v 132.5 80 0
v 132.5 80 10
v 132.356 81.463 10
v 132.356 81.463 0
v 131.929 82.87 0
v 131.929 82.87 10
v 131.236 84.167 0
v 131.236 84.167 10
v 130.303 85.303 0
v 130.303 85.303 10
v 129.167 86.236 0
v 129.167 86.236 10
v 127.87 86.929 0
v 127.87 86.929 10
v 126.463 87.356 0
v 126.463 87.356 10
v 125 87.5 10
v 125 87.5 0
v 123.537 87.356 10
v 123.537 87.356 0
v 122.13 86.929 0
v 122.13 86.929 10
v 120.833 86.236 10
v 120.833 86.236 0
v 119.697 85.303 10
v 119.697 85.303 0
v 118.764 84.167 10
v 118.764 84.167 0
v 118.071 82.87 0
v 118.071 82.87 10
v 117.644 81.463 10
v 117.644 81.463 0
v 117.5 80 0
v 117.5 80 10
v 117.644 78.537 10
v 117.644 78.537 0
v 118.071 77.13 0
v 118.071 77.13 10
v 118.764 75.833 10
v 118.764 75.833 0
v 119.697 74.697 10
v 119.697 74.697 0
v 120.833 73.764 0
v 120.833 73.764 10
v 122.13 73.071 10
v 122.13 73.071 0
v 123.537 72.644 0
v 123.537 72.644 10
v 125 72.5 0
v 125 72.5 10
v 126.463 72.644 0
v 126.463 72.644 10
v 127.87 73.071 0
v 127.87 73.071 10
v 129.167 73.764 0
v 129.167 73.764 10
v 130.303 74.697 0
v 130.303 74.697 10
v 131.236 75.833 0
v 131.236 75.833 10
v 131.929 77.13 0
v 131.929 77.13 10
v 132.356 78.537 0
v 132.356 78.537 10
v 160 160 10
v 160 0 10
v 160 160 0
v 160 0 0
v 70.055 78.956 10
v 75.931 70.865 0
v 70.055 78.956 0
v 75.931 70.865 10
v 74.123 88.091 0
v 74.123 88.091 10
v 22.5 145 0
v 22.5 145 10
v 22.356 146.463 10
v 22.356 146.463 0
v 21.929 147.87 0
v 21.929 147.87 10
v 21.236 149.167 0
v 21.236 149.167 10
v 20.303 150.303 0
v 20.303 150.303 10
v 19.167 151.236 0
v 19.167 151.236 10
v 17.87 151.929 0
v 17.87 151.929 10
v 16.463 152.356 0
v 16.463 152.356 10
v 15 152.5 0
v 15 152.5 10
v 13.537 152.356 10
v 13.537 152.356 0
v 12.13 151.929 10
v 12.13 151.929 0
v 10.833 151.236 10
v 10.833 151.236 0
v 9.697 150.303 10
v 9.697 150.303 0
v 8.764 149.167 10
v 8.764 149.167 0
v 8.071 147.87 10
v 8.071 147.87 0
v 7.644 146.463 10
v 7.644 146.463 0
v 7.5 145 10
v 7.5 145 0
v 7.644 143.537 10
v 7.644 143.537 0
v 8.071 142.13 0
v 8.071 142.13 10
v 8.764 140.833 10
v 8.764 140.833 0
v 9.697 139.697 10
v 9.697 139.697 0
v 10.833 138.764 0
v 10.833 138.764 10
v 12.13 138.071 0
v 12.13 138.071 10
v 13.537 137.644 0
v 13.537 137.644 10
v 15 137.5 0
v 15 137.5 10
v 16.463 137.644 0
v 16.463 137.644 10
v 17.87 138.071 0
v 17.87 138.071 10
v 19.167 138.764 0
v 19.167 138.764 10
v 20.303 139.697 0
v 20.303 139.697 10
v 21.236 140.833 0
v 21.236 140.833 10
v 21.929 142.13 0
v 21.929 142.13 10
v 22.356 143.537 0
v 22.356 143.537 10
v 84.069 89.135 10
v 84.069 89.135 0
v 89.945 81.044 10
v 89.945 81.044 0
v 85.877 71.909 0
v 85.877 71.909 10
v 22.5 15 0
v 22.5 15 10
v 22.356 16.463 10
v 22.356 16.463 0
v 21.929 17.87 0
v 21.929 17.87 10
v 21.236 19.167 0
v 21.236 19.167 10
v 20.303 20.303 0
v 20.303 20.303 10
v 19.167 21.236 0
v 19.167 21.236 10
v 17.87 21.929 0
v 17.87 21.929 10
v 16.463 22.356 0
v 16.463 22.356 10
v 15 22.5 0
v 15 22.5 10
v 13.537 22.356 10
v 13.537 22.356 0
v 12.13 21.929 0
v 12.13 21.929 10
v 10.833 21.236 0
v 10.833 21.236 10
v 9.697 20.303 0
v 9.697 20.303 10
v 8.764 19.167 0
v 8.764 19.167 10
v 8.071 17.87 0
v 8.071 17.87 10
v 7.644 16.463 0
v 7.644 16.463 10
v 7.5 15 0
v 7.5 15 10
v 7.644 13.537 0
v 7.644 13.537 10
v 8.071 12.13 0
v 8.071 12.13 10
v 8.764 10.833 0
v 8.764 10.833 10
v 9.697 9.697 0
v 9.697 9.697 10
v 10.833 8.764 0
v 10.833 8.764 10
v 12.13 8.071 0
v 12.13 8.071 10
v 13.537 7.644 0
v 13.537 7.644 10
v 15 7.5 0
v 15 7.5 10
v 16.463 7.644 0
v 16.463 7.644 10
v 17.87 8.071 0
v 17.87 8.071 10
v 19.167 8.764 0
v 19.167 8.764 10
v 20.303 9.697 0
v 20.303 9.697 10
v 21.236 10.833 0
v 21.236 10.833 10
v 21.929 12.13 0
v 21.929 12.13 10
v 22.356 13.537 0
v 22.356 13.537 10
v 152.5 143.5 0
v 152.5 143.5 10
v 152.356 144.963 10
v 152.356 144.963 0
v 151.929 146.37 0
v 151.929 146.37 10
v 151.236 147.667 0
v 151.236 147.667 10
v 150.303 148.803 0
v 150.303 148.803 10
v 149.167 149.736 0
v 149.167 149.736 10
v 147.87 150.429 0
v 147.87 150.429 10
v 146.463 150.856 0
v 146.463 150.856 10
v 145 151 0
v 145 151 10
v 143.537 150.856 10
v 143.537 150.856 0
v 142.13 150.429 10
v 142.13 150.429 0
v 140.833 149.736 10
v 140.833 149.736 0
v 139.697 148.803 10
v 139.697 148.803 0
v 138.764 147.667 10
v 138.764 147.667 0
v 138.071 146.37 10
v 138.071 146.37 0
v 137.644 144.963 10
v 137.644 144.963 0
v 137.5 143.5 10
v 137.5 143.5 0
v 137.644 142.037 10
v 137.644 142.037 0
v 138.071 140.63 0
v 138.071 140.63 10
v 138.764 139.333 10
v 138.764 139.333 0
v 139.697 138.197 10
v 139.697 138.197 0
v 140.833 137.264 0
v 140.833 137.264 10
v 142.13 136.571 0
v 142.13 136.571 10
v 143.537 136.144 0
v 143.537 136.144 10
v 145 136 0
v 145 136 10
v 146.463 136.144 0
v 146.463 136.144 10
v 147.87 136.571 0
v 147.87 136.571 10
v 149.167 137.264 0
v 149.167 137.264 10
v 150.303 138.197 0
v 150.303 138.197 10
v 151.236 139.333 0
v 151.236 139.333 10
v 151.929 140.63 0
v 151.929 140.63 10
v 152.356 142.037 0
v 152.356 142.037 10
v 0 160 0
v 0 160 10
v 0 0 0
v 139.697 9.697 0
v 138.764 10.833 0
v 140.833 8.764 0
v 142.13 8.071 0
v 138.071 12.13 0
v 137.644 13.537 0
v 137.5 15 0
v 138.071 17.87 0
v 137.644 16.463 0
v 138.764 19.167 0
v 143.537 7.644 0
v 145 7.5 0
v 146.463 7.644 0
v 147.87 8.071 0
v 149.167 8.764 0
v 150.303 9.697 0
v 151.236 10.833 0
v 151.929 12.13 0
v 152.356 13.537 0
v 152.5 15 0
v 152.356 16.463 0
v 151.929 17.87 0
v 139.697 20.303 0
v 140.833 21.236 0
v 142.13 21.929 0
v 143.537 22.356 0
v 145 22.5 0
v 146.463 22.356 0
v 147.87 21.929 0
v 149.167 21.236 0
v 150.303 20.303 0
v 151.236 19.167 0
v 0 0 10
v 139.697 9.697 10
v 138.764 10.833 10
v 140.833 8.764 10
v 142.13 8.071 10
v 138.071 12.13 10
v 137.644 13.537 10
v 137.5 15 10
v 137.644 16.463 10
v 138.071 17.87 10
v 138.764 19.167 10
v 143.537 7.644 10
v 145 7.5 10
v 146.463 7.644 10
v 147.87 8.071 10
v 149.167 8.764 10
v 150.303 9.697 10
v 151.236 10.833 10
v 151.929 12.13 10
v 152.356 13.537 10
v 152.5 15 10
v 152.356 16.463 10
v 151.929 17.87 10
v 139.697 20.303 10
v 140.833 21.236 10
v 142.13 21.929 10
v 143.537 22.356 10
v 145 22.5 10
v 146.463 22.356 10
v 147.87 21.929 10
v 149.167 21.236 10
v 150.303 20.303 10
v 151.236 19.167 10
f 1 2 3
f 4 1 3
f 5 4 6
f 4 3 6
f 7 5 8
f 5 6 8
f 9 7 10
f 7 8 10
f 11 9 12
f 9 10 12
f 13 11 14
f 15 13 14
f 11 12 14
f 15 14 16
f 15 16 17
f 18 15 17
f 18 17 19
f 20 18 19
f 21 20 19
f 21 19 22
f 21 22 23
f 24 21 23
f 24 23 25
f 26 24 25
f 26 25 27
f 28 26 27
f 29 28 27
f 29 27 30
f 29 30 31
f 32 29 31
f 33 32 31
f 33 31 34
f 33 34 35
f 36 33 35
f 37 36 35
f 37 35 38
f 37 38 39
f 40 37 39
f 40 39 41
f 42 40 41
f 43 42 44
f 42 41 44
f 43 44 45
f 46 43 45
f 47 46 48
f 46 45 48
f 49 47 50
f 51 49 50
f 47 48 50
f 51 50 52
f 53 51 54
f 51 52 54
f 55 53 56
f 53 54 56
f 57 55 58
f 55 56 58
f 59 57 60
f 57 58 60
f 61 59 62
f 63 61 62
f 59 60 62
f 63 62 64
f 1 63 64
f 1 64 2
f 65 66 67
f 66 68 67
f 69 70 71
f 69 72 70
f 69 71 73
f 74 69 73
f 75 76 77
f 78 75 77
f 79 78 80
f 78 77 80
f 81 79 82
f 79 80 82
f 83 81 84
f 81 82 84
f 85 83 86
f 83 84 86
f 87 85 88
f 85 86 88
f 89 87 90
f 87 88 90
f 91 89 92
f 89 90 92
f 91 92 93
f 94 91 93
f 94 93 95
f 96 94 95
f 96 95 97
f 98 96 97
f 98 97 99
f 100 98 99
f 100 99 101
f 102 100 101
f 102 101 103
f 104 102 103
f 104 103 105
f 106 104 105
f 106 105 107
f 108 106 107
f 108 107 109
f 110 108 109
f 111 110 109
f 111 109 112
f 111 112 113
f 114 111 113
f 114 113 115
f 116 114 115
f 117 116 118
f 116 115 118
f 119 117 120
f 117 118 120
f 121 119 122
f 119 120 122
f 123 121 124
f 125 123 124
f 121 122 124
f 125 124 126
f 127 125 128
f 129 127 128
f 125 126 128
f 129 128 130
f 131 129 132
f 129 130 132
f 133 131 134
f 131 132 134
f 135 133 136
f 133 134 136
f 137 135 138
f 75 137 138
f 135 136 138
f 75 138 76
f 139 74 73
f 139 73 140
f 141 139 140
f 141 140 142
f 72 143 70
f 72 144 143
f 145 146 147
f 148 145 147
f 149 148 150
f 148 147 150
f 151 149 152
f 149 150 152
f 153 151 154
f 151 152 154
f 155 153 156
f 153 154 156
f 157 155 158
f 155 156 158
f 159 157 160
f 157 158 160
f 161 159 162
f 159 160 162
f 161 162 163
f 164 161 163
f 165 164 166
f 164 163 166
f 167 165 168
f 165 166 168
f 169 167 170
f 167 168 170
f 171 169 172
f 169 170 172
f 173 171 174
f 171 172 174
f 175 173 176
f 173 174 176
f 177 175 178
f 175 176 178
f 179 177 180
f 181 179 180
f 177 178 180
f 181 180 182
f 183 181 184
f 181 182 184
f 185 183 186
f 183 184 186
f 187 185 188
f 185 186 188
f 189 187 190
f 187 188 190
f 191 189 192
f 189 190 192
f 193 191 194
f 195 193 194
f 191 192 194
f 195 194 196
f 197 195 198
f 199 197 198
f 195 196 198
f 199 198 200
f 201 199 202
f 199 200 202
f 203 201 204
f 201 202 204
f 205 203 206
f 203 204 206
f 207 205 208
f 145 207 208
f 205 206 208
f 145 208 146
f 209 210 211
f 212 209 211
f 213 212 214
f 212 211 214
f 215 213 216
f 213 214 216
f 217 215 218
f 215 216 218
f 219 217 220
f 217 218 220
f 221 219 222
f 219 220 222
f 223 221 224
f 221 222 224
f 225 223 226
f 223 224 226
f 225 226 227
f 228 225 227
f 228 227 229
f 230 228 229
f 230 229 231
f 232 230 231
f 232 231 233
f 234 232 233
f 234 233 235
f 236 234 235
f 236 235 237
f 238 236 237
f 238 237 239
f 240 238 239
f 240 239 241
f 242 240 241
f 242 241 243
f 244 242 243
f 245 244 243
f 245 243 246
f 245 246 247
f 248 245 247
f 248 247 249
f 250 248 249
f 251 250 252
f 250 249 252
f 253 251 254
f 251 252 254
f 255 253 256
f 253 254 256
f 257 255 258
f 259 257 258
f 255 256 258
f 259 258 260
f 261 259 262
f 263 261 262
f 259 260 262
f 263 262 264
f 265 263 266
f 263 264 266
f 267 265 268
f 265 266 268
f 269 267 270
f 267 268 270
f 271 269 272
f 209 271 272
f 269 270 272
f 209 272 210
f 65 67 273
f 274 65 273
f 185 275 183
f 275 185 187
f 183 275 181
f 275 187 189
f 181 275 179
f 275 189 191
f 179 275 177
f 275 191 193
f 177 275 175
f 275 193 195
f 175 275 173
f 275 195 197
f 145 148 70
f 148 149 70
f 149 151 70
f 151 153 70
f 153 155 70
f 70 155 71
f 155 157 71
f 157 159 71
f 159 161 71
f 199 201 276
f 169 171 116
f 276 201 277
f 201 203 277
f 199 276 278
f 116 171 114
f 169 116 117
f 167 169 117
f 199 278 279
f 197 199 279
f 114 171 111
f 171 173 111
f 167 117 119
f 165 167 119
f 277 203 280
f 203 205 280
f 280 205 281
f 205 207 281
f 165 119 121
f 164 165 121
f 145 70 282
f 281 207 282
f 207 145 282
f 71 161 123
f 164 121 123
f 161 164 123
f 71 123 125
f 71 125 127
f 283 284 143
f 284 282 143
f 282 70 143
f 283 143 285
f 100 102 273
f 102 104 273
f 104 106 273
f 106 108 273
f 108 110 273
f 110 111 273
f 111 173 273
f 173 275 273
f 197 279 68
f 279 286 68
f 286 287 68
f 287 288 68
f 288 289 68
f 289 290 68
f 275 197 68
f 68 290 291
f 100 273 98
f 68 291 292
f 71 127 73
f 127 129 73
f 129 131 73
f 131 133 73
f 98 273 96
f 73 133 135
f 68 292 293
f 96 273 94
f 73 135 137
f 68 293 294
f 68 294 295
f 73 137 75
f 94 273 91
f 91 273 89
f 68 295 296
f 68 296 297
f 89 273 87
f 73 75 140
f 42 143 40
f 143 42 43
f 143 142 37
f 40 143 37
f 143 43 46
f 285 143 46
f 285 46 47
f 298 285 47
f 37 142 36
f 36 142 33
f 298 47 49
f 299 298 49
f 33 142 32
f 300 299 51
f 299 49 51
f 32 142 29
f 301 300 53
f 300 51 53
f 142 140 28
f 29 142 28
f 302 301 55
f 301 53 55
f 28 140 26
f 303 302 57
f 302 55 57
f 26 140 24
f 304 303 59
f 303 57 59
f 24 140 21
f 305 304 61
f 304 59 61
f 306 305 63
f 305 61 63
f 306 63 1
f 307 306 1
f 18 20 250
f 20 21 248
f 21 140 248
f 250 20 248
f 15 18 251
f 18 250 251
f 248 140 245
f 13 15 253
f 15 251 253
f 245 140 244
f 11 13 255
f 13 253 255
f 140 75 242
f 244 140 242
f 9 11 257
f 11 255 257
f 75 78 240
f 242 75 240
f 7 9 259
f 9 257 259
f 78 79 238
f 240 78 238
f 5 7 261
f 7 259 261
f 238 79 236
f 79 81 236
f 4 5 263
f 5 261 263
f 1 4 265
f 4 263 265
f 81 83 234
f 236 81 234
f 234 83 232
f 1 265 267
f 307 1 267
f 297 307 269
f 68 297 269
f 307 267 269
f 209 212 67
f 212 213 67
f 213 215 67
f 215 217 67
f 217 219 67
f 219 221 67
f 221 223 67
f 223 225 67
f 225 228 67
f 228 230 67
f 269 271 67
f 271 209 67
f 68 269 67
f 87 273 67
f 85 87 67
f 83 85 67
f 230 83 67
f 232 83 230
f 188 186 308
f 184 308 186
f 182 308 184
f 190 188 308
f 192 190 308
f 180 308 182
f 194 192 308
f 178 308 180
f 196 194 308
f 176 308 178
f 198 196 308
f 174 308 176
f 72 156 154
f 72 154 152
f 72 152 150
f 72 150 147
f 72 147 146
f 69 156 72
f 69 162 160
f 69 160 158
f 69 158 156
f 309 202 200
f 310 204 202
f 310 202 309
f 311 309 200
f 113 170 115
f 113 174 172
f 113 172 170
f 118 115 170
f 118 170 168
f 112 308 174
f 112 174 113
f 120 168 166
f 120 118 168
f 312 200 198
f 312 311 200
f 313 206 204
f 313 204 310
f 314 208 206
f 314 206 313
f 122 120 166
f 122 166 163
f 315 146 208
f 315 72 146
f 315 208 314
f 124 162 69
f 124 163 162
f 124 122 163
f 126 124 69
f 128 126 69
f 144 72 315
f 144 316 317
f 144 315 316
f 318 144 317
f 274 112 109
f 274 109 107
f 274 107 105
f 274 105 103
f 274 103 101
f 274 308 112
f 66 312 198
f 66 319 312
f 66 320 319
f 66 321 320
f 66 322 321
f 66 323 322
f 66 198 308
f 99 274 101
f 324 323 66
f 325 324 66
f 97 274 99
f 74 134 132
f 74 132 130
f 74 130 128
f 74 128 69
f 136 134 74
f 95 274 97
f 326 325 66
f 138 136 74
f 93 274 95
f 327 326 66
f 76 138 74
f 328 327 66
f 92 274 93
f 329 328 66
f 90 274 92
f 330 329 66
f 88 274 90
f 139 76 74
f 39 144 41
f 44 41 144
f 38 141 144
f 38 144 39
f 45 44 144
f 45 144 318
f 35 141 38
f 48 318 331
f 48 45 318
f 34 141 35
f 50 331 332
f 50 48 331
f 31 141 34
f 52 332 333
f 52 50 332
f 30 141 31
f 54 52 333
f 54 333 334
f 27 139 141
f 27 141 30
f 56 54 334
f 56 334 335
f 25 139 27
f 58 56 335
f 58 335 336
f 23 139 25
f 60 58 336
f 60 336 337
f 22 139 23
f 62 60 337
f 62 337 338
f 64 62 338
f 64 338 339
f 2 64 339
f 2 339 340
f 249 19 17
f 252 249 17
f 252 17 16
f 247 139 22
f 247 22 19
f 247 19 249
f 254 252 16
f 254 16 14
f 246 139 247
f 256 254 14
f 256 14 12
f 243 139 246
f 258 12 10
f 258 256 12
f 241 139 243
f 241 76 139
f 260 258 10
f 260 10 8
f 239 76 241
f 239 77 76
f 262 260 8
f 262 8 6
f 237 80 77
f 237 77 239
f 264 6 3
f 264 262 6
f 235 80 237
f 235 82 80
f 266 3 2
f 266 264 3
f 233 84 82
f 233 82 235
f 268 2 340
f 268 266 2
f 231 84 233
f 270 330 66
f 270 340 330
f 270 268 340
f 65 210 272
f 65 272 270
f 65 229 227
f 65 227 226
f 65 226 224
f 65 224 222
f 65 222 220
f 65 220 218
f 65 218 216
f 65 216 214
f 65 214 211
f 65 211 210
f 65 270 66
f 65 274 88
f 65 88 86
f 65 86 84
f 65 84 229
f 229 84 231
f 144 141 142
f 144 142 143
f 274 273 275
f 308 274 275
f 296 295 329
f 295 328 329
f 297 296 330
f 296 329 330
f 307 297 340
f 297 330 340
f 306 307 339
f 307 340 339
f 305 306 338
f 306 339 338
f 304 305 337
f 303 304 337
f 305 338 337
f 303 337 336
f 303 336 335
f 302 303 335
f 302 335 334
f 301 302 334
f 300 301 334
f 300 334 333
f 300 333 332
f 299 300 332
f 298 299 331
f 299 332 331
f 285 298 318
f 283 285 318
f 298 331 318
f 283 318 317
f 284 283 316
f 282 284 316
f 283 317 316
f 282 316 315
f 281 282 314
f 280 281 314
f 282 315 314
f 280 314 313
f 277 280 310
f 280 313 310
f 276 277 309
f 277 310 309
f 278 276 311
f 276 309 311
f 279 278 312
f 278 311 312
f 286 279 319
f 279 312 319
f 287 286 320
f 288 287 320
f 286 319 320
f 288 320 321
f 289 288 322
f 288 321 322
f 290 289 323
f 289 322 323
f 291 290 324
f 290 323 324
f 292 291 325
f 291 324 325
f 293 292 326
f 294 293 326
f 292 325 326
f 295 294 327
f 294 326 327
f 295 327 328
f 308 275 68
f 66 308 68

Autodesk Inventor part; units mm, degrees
ref_plane "YZ Plane" through (0, 0, 0) normal (1, 0, 0) x (0, 1, 0)
ref_plane "XZ Plane" through (0, 0, 0) normal (0, 1, 0) x (-1, 0, 0)
ref_plane "XY Plane" through (0, 0, 0) normal (0, 0, 1) x (1, 0, 0)
sketch "Sketch1" plane through (0, 0, 0) normal (0, 0, 1) x (1, 0, 0)
  line L0 (0, 0) -> (160, 0)
  line L1 (160, 0) -> (160, 160)
  line L2 (160, 160) -> (0, 160)
  line L3 (0, 160) -> (0, 0)
  dimension "d0" = 160
  dimension "d1" = 160
extrude "Extrusion1" add sketch "Sketch1" along normal blind 10
sketch "Sketch2" plane through (0, 0, 10) normal (0, 0, 1) x (1, 0, 0)
  line L0 (0, 0) -> (160, 0) projected
  line L1 (0, 0) -> (15, 0)
  line L2 (15, 0) -> (15, 15)
  line L3 (160, 160) -> (0, 160) projected
  line L4 (0, 160) -> (15, 160)
  line L5 (15, 160) -> (15, 145)
  line L6 (160, 0) -> (160, 160) projected
  line L7 (160, 160) -> (145, 160)
  line L8 (145, 160) -> (145, 143.5)
  line L9 (160, 0) -> (160, 15)
  line L10 (160, 15) -> (145, 15)
  circle A0 centre (15, 145) radius 7.5
  circle A1 centre (145, 143.5) radius 7.5
  circle A2 centre (145, 15) radius 7.5
  circle A3 centre (15, 15) radius 7.5
  dimension "d4" = 15
  dimension "d5" = 15
  dimension "d6" = 15
  dimension "d7" = 15
  dimension "d8" = 15
  dimension "d9" = 16.5
  dimension "d10" = 15
  dimension "d11" = 15
  dimension "d12" = 15
  dimension "d13" = 15
  dimension "d14" = 15
  dimension "d15" = 15
extrude "Extrusion2" cut sketch "Sketch2" against normal blind 10
sketch "Sketch3" plane through (0, 0, 10) normal (0, 0, 1) x (1, 0, 0)
  line L0 (0, 160) -> (0, 0) projected
  line L1 (0, 0) -> (80, 0)
  line L2 (0, 0) -> (160, 0) projected
  line L3 (80, 0) -> (0, 0)
  line L4 (0, 0) -> (80, 0)
  dimension "d18" = 80
  dimension "d19" = 80
  dimension "d20" = 80
sketch "Sketch4" plane through (0, 0, 10) normal (0, 0, 1) x (1, 0, 0)
  line L0 (0, 0) -> (160, 0) projected
  line L1 (0, 0) -> (0, 80)
  line L2 (0, 160) -> (0, 0) projected
  dimension "d21" = 80
sketch "Sketch5" plane through (0, 0, 10) normal (0, 0, 1) x (1, 0, 0)
  line L0 (0, 160) -> (0, 0) projected
  line L1 (0, 80) -> (80, 80)
  line L2 (84.0688, 89.1348) -> (89.9454, 81.0437)
  line L3 (89.9454, 81.0437) -> (85.8766, 71.9089)
  line L4 (85.8766, 71.9089) -> (75.9312, 70.8652)
  line L5 (75.9312, 70.8652) -> (70.0546, 78.9563)
  line L6 (70.0546, 78.9563) -> (74.1234, 88.0911)
  line L7 (74.1234, 88.0911) -> (84.0688, 89.1348)
  dimension "d22" = 80
  dimension "d23" = 10
extrude "Extrusion3" cut sketch "Sketch5" against normal blind 10
sketch "Sketch6" plane through (0, 0, 10) normal (0, 0, 1) x (1, 0, 0)
  line L0 (160, 0) -> (160, 160) projected
  line L1 (160, 0) -> (160, 80)
  point P0 (0, 0)
  dimension "d26" = 80
sketch "Sketch7" plane through (0, 0, 10) normal (0, 0, 1) x (1, 0, 0)
  line L0 (160, 0) -> (160, 160) projected
  line L1 (160, 80) -> (125, 80)
  circle A0 centre (125, 80) radius 7.5
  point P0 (0, 0)
  dimension "d27" = 35
  dimension "d28" = 15
extrude "Extrusion4" cut sketch "Sketch7" against normal blind 10
properties part number "101"
